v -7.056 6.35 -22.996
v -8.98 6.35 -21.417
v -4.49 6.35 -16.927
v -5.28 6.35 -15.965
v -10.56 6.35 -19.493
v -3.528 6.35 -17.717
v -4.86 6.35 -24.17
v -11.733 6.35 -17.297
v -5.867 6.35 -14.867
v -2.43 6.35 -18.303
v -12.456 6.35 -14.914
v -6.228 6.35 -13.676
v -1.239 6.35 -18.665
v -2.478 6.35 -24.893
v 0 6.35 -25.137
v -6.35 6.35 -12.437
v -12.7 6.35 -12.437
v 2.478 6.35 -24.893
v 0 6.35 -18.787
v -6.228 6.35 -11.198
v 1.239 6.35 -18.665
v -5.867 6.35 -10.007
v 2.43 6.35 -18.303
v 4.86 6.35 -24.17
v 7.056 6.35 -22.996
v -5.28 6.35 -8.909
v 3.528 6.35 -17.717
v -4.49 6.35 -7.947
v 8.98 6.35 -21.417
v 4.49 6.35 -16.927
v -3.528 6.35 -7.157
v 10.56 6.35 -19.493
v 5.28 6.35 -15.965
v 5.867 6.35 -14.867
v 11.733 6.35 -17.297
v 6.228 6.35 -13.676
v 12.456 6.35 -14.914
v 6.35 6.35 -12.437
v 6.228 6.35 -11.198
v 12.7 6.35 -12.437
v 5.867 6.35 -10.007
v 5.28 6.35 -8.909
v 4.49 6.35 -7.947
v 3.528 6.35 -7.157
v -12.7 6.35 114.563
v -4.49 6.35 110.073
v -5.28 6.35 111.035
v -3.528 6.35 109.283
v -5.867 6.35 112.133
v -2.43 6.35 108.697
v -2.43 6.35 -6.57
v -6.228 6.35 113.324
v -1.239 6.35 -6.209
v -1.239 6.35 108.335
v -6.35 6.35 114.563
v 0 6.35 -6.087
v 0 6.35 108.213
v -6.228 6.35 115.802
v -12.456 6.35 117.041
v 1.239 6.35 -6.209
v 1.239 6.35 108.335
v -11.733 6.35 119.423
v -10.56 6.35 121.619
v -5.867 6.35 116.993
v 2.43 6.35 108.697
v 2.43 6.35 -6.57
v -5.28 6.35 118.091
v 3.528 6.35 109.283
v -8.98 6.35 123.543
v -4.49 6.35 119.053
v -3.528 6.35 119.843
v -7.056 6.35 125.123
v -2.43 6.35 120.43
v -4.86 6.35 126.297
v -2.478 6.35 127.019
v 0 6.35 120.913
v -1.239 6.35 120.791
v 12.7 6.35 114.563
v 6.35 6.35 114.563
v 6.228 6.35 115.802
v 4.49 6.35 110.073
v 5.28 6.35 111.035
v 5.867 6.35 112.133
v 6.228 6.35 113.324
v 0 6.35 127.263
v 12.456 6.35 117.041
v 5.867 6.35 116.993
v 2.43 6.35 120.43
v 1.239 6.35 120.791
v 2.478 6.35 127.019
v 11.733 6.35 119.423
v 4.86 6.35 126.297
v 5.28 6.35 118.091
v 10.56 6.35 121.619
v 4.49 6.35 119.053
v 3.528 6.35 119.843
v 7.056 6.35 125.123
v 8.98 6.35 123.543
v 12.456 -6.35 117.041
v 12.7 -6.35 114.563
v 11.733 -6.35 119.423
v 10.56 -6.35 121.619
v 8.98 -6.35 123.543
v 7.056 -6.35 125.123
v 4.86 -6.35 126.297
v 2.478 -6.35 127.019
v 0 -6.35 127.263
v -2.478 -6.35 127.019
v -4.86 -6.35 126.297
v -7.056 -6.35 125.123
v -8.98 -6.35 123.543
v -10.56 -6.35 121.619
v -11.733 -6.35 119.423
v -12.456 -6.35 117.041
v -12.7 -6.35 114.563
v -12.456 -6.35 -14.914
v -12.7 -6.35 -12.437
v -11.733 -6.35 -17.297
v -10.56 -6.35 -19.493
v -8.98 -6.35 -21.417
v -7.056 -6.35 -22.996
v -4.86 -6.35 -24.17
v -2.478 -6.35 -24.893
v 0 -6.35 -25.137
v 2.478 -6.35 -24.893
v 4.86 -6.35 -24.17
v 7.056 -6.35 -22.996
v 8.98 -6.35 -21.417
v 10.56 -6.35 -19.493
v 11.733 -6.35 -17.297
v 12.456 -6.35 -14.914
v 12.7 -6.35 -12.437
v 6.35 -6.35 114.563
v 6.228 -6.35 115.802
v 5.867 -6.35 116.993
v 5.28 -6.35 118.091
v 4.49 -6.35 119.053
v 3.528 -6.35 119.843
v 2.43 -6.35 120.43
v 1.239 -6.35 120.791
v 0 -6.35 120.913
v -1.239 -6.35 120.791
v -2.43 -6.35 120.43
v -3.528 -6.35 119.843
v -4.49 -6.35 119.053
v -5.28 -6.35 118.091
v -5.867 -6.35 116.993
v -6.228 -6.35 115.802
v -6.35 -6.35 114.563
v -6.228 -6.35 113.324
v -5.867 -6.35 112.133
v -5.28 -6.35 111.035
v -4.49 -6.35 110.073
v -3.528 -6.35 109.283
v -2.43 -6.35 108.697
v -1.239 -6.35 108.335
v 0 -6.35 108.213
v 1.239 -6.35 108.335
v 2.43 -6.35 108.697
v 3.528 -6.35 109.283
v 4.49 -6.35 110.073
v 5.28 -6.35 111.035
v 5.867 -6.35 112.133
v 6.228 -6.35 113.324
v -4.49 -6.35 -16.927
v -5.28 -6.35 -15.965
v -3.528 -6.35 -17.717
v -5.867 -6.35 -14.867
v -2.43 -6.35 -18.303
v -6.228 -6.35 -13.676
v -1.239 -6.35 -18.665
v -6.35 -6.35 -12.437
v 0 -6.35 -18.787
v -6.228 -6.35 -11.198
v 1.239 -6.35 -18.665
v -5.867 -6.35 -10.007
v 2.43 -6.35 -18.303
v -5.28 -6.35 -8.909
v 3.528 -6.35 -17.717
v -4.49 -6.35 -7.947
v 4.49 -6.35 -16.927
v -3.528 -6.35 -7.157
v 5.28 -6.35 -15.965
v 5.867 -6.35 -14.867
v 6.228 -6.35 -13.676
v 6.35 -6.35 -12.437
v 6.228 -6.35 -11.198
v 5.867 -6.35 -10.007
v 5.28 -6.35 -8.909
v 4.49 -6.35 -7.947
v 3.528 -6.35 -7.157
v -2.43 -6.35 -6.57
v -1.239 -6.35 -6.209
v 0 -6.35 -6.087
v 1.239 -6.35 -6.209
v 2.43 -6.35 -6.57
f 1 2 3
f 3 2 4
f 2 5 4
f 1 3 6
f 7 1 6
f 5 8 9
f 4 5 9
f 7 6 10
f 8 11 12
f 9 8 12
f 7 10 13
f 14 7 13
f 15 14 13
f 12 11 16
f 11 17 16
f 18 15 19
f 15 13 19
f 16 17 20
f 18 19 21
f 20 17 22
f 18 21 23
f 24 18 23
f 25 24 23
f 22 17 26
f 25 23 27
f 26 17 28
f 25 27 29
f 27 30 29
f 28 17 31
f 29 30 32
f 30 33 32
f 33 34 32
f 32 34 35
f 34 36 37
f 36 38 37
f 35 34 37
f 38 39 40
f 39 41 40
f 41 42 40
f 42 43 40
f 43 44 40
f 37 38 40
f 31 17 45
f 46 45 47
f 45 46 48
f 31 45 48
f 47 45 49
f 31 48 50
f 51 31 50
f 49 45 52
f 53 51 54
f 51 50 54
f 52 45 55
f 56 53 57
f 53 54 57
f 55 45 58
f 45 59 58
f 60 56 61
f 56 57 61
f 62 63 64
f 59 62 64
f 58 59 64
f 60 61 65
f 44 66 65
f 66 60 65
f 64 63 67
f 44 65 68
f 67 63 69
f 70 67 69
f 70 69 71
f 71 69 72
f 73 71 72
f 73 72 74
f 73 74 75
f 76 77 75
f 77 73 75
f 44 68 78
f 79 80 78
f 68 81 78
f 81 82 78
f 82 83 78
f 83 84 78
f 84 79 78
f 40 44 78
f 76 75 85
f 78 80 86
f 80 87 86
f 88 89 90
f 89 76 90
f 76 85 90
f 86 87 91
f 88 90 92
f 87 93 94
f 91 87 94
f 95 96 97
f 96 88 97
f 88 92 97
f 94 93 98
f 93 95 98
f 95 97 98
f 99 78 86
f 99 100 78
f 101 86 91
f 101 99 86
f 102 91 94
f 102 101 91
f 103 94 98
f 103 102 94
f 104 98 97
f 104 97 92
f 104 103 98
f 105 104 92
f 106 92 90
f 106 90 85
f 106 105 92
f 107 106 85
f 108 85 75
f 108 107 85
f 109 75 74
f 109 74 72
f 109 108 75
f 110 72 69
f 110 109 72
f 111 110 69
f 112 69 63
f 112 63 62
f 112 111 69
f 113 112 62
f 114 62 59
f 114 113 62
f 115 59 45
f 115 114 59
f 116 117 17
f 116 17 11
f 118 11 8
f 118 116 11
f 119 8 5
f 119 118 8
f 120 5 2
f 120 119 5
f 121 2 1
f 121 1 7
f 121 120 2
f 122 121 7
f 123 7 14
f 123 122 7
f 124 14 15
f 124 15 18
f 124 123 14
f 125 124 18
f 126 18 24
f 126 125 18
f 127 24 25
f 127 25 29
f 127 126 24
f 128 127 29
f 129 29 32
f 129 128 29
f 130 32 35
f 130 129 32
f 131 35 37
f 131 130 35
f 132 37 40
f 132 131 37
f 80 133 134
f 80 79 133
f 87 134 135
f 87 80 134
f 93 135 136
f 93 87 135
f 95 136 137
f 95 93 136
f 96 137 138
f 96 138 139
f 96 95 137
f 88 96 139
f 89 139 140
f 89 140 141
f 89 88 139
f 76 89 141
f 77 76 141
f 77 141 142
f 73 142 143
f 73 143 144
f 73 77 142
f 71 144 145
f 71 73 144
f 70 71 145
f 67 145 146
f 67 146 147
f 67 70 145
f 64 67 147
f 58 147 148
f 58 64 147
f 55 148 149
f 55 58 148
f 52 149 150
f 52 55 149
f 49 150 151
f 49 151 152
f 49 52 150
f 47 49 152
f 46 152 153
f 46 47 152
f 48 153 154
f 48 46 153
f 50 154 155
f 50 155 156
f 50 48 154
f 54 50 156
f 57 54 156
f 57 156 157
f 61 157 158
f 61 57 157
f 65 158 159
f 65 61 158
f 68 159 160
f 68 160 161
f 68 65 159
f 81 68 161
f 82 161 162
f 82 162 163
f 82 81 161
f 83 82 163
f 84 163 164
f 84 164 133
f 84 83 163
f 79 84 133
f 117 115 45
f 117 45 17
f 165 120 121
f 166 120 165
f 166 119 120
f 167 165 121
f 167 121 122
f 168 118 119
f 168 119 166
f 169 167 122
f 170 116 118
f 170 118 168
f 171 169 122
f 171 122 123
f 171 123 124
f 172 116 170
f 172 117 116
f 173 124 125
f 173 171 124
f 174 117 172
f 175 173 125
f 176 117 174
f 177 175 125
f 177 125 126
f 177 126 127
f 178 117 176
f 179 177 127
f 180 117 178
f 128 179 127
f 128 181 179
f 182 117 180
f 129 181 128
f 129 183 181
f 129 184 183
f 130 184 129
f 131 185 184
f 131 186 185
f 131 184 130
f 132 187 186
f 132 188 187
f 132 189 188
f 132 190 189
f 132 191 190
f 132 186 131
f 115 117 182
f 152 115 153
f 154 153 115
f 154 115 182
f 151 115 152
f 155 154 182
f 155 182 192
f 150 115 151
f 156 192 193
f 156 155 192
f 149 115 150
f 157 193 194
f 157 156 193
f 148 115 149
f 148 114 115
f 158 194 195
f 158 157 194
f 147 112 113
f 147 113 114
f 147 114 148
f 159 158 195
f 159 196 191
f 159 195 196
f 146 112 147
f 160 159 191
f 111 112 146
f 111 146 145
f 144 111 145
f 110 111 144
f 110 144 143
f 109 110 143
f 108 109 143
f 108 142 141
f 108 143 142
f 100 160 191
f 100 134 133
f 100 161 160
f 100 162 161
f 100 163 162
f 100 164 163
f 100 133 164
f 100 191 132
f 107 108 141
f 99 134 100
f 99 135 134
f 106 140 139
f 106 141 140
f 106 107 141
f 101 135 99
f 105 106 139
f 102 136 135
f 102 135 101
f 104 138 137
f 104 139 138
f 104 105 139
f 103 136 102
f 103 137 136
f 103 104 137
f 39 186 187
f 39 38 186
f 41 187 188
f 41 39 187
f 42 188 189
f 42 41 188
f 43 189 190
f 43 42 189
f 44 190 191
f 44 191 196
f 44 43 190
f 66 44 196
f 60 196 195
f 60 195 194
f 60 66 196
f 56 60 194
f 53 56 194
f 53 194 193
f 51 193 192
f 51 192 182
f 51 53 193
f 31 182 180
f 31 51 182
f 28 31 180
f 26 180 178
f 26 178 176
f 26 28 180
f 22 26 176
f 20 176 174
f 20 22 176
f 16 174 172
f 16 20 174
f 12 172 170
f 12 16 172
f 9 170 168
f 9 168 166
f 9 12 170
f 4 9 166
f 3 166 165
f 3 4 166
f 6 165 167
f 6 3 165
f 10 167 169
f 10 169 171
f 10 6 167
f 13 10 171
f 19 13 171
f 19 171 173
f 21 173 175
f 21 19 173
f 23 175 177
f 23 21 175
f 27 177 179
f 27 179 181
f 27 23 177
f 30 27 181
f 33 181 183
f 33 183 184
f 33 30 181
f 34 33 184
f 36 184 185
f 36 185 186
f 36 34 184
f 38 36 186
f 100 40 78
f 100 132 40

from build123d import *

# Parameters (mm, degrees)
F0_R     = 6.35
F1_DEPTH = 6.35


with BuildPart() as f1:
    # F0 (on Front) → F1 (new body, symmetric)
    with BuildSketch(Plane.XZ):
        with BuildLine():
            ThreePointArc((-12.7, 114.563232), (0, 101.863232), (12.7, 114.563232))
            ThreePointArc((12.7, 114.563232), (0, 127.263232), (-12.7, 114.563232))
        make_face()
        with Locations((0, 114.563232)):
            Circle(F0_R, mode=Mode.SUBTRACT)
        with BuildLine():
            Line((12.7, -12.436768), (12.7, 114.563232))
            ThreePointArc((12.7, 114.563232), (0, 101.863232), (-12.7, 114.563232))
            Line((-12.7, 114.563232), (-12.7, -12.436768))
            ThreePointArc((-12.7, -12.436768), (0, 0.263232), (12.7, -12.436768))
        make_face()
        with BuildLine():
            ThreePointArc((-12.7, -12.436768), (0, -25.136768), (12.7, -12.436768))
            ThreePointArc((12.7, -12.436768), (0, 0.263232), (-12.7, -12.436768))
        make_face()
        with Locations((0, -12.436768)):
            Circle(F0_R, mode=Mode.SUBTRACT)
    extrude(amount=F1_DEPTH, both=True)


solid = f1.part
